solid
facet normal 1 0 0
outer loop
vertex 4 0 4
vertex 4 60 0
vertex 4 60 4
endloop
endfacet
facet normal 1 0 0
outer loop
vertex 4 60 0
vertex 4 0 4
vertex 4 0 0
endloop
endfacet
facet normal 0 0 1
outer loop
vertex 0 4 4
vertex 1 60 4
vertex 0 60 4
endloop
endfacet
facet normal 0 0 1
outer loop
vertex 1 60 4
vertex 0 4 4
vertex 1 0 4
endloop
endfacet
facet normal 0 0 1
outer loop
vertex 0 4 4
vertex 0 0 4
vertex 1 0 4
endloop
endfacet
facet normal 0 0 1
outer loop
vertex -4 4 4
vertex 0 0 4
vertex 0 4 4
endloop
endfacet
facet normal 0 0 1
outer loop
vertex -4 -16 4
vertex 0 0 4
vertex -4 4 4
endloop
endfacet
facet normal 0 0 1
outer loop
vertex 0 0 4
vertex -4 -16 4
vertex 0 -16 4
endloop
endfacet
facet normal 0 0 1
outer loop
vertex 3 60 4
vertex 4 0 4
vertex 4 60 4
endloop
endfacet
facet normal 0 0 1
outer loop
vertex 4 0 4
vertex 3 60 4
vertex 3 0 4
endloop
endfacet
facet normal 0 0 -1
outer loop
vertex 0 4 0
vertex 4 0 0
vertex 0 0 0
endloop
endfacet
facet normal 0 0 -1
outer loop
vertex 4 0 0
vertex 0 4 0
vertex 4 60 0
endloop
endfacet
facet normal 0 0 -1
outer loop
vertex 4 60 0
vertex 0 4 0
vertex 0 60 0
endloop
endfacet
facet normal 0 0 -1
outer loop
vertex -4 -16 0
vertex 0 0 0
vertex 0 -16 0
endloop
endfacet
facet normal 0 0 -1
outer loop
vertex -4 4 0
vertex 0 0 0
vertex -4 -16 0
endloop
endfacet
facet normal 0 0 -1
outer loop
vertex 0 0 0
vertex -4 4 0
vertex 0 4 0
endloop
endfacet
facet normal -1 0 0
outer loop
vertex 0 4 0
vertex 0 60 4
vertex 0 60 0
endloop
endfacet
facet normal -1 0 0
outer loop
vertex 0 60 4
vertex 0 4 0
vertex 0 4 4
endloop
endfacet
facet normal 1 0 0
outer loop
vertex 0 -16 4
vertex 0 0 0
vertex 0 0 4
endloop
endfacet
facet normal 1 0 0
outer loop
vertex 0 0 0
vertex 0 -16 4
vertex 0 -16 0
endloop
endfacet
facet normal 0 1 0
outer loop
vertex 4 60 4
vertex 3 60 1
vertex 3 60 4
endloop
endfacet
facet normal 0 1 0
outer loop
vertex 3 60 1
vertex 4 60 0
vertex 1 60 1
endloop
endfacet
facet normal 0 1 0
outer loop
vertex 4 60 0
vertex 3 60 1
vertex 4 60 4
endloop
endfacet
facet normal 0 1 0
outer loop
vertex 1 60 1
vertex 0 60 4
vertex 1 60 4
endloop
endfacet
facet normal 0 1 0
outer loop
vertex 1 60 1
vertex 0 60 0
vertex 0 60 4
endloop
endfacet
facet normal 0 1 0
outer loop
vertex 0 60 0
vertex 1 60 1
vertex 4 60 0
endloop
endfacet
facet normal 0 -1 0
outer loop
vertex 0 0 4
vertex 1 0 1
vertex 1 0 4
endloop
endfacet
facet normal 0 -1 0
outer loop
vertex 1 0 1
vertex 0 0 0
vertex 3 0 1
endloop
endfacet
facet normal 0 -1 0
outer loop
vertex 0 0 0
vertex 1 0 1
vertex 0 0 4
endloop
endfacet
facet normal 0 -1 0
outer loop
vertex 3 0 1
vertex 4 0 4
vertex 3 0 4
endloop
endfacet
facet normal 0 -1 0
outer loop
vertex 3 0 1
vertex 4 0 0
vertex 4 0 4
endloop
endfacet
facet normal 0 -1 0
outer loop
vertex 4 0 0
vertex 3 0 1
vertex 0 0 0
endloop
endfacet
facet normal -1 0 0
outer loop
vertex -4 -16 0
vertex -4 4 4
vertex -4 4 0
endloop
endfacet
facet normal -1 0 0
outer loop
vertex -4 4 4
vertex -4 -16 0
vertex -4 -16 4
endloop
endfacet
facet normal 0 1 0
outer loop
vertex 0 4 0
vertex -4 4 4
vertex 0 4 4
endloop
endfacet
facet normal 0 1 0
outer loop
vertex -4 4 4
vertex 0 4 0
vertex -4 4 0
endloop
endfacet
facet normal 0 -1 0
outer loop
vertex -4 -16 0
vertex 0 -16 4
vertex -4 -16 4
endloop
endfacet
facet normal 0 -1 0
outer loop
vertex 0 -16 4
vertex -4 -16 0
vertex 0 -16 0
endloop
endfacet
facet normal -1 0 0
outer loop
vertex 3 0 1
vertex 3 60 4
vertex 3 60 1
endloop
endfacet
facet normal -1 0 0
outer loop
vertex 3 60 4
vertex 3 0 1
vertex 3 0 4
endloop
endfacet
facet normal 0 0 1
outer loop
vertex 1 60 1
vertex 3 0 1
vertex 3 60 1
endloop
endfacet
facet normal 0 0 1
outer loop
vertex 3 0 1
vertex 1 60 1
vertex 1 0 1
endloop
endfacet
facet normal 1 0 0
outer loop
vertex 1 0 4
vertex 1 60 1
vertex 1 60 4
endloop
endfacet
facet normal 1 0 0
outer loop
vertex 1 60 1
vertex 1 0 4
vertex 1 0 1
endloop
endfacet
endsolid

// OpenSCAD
$fn=32;

thick=4;
channel=2;
length=60;
height=8;
support=20;

difference() {
    union() {
        cube([thick,length,thick]);
        translate([-thick,-16,0])
            cube([thick,support,thick]);
    }
    translate([channel/2,-1,channel/2])
        cube([channel,length+2,thick]);
}
